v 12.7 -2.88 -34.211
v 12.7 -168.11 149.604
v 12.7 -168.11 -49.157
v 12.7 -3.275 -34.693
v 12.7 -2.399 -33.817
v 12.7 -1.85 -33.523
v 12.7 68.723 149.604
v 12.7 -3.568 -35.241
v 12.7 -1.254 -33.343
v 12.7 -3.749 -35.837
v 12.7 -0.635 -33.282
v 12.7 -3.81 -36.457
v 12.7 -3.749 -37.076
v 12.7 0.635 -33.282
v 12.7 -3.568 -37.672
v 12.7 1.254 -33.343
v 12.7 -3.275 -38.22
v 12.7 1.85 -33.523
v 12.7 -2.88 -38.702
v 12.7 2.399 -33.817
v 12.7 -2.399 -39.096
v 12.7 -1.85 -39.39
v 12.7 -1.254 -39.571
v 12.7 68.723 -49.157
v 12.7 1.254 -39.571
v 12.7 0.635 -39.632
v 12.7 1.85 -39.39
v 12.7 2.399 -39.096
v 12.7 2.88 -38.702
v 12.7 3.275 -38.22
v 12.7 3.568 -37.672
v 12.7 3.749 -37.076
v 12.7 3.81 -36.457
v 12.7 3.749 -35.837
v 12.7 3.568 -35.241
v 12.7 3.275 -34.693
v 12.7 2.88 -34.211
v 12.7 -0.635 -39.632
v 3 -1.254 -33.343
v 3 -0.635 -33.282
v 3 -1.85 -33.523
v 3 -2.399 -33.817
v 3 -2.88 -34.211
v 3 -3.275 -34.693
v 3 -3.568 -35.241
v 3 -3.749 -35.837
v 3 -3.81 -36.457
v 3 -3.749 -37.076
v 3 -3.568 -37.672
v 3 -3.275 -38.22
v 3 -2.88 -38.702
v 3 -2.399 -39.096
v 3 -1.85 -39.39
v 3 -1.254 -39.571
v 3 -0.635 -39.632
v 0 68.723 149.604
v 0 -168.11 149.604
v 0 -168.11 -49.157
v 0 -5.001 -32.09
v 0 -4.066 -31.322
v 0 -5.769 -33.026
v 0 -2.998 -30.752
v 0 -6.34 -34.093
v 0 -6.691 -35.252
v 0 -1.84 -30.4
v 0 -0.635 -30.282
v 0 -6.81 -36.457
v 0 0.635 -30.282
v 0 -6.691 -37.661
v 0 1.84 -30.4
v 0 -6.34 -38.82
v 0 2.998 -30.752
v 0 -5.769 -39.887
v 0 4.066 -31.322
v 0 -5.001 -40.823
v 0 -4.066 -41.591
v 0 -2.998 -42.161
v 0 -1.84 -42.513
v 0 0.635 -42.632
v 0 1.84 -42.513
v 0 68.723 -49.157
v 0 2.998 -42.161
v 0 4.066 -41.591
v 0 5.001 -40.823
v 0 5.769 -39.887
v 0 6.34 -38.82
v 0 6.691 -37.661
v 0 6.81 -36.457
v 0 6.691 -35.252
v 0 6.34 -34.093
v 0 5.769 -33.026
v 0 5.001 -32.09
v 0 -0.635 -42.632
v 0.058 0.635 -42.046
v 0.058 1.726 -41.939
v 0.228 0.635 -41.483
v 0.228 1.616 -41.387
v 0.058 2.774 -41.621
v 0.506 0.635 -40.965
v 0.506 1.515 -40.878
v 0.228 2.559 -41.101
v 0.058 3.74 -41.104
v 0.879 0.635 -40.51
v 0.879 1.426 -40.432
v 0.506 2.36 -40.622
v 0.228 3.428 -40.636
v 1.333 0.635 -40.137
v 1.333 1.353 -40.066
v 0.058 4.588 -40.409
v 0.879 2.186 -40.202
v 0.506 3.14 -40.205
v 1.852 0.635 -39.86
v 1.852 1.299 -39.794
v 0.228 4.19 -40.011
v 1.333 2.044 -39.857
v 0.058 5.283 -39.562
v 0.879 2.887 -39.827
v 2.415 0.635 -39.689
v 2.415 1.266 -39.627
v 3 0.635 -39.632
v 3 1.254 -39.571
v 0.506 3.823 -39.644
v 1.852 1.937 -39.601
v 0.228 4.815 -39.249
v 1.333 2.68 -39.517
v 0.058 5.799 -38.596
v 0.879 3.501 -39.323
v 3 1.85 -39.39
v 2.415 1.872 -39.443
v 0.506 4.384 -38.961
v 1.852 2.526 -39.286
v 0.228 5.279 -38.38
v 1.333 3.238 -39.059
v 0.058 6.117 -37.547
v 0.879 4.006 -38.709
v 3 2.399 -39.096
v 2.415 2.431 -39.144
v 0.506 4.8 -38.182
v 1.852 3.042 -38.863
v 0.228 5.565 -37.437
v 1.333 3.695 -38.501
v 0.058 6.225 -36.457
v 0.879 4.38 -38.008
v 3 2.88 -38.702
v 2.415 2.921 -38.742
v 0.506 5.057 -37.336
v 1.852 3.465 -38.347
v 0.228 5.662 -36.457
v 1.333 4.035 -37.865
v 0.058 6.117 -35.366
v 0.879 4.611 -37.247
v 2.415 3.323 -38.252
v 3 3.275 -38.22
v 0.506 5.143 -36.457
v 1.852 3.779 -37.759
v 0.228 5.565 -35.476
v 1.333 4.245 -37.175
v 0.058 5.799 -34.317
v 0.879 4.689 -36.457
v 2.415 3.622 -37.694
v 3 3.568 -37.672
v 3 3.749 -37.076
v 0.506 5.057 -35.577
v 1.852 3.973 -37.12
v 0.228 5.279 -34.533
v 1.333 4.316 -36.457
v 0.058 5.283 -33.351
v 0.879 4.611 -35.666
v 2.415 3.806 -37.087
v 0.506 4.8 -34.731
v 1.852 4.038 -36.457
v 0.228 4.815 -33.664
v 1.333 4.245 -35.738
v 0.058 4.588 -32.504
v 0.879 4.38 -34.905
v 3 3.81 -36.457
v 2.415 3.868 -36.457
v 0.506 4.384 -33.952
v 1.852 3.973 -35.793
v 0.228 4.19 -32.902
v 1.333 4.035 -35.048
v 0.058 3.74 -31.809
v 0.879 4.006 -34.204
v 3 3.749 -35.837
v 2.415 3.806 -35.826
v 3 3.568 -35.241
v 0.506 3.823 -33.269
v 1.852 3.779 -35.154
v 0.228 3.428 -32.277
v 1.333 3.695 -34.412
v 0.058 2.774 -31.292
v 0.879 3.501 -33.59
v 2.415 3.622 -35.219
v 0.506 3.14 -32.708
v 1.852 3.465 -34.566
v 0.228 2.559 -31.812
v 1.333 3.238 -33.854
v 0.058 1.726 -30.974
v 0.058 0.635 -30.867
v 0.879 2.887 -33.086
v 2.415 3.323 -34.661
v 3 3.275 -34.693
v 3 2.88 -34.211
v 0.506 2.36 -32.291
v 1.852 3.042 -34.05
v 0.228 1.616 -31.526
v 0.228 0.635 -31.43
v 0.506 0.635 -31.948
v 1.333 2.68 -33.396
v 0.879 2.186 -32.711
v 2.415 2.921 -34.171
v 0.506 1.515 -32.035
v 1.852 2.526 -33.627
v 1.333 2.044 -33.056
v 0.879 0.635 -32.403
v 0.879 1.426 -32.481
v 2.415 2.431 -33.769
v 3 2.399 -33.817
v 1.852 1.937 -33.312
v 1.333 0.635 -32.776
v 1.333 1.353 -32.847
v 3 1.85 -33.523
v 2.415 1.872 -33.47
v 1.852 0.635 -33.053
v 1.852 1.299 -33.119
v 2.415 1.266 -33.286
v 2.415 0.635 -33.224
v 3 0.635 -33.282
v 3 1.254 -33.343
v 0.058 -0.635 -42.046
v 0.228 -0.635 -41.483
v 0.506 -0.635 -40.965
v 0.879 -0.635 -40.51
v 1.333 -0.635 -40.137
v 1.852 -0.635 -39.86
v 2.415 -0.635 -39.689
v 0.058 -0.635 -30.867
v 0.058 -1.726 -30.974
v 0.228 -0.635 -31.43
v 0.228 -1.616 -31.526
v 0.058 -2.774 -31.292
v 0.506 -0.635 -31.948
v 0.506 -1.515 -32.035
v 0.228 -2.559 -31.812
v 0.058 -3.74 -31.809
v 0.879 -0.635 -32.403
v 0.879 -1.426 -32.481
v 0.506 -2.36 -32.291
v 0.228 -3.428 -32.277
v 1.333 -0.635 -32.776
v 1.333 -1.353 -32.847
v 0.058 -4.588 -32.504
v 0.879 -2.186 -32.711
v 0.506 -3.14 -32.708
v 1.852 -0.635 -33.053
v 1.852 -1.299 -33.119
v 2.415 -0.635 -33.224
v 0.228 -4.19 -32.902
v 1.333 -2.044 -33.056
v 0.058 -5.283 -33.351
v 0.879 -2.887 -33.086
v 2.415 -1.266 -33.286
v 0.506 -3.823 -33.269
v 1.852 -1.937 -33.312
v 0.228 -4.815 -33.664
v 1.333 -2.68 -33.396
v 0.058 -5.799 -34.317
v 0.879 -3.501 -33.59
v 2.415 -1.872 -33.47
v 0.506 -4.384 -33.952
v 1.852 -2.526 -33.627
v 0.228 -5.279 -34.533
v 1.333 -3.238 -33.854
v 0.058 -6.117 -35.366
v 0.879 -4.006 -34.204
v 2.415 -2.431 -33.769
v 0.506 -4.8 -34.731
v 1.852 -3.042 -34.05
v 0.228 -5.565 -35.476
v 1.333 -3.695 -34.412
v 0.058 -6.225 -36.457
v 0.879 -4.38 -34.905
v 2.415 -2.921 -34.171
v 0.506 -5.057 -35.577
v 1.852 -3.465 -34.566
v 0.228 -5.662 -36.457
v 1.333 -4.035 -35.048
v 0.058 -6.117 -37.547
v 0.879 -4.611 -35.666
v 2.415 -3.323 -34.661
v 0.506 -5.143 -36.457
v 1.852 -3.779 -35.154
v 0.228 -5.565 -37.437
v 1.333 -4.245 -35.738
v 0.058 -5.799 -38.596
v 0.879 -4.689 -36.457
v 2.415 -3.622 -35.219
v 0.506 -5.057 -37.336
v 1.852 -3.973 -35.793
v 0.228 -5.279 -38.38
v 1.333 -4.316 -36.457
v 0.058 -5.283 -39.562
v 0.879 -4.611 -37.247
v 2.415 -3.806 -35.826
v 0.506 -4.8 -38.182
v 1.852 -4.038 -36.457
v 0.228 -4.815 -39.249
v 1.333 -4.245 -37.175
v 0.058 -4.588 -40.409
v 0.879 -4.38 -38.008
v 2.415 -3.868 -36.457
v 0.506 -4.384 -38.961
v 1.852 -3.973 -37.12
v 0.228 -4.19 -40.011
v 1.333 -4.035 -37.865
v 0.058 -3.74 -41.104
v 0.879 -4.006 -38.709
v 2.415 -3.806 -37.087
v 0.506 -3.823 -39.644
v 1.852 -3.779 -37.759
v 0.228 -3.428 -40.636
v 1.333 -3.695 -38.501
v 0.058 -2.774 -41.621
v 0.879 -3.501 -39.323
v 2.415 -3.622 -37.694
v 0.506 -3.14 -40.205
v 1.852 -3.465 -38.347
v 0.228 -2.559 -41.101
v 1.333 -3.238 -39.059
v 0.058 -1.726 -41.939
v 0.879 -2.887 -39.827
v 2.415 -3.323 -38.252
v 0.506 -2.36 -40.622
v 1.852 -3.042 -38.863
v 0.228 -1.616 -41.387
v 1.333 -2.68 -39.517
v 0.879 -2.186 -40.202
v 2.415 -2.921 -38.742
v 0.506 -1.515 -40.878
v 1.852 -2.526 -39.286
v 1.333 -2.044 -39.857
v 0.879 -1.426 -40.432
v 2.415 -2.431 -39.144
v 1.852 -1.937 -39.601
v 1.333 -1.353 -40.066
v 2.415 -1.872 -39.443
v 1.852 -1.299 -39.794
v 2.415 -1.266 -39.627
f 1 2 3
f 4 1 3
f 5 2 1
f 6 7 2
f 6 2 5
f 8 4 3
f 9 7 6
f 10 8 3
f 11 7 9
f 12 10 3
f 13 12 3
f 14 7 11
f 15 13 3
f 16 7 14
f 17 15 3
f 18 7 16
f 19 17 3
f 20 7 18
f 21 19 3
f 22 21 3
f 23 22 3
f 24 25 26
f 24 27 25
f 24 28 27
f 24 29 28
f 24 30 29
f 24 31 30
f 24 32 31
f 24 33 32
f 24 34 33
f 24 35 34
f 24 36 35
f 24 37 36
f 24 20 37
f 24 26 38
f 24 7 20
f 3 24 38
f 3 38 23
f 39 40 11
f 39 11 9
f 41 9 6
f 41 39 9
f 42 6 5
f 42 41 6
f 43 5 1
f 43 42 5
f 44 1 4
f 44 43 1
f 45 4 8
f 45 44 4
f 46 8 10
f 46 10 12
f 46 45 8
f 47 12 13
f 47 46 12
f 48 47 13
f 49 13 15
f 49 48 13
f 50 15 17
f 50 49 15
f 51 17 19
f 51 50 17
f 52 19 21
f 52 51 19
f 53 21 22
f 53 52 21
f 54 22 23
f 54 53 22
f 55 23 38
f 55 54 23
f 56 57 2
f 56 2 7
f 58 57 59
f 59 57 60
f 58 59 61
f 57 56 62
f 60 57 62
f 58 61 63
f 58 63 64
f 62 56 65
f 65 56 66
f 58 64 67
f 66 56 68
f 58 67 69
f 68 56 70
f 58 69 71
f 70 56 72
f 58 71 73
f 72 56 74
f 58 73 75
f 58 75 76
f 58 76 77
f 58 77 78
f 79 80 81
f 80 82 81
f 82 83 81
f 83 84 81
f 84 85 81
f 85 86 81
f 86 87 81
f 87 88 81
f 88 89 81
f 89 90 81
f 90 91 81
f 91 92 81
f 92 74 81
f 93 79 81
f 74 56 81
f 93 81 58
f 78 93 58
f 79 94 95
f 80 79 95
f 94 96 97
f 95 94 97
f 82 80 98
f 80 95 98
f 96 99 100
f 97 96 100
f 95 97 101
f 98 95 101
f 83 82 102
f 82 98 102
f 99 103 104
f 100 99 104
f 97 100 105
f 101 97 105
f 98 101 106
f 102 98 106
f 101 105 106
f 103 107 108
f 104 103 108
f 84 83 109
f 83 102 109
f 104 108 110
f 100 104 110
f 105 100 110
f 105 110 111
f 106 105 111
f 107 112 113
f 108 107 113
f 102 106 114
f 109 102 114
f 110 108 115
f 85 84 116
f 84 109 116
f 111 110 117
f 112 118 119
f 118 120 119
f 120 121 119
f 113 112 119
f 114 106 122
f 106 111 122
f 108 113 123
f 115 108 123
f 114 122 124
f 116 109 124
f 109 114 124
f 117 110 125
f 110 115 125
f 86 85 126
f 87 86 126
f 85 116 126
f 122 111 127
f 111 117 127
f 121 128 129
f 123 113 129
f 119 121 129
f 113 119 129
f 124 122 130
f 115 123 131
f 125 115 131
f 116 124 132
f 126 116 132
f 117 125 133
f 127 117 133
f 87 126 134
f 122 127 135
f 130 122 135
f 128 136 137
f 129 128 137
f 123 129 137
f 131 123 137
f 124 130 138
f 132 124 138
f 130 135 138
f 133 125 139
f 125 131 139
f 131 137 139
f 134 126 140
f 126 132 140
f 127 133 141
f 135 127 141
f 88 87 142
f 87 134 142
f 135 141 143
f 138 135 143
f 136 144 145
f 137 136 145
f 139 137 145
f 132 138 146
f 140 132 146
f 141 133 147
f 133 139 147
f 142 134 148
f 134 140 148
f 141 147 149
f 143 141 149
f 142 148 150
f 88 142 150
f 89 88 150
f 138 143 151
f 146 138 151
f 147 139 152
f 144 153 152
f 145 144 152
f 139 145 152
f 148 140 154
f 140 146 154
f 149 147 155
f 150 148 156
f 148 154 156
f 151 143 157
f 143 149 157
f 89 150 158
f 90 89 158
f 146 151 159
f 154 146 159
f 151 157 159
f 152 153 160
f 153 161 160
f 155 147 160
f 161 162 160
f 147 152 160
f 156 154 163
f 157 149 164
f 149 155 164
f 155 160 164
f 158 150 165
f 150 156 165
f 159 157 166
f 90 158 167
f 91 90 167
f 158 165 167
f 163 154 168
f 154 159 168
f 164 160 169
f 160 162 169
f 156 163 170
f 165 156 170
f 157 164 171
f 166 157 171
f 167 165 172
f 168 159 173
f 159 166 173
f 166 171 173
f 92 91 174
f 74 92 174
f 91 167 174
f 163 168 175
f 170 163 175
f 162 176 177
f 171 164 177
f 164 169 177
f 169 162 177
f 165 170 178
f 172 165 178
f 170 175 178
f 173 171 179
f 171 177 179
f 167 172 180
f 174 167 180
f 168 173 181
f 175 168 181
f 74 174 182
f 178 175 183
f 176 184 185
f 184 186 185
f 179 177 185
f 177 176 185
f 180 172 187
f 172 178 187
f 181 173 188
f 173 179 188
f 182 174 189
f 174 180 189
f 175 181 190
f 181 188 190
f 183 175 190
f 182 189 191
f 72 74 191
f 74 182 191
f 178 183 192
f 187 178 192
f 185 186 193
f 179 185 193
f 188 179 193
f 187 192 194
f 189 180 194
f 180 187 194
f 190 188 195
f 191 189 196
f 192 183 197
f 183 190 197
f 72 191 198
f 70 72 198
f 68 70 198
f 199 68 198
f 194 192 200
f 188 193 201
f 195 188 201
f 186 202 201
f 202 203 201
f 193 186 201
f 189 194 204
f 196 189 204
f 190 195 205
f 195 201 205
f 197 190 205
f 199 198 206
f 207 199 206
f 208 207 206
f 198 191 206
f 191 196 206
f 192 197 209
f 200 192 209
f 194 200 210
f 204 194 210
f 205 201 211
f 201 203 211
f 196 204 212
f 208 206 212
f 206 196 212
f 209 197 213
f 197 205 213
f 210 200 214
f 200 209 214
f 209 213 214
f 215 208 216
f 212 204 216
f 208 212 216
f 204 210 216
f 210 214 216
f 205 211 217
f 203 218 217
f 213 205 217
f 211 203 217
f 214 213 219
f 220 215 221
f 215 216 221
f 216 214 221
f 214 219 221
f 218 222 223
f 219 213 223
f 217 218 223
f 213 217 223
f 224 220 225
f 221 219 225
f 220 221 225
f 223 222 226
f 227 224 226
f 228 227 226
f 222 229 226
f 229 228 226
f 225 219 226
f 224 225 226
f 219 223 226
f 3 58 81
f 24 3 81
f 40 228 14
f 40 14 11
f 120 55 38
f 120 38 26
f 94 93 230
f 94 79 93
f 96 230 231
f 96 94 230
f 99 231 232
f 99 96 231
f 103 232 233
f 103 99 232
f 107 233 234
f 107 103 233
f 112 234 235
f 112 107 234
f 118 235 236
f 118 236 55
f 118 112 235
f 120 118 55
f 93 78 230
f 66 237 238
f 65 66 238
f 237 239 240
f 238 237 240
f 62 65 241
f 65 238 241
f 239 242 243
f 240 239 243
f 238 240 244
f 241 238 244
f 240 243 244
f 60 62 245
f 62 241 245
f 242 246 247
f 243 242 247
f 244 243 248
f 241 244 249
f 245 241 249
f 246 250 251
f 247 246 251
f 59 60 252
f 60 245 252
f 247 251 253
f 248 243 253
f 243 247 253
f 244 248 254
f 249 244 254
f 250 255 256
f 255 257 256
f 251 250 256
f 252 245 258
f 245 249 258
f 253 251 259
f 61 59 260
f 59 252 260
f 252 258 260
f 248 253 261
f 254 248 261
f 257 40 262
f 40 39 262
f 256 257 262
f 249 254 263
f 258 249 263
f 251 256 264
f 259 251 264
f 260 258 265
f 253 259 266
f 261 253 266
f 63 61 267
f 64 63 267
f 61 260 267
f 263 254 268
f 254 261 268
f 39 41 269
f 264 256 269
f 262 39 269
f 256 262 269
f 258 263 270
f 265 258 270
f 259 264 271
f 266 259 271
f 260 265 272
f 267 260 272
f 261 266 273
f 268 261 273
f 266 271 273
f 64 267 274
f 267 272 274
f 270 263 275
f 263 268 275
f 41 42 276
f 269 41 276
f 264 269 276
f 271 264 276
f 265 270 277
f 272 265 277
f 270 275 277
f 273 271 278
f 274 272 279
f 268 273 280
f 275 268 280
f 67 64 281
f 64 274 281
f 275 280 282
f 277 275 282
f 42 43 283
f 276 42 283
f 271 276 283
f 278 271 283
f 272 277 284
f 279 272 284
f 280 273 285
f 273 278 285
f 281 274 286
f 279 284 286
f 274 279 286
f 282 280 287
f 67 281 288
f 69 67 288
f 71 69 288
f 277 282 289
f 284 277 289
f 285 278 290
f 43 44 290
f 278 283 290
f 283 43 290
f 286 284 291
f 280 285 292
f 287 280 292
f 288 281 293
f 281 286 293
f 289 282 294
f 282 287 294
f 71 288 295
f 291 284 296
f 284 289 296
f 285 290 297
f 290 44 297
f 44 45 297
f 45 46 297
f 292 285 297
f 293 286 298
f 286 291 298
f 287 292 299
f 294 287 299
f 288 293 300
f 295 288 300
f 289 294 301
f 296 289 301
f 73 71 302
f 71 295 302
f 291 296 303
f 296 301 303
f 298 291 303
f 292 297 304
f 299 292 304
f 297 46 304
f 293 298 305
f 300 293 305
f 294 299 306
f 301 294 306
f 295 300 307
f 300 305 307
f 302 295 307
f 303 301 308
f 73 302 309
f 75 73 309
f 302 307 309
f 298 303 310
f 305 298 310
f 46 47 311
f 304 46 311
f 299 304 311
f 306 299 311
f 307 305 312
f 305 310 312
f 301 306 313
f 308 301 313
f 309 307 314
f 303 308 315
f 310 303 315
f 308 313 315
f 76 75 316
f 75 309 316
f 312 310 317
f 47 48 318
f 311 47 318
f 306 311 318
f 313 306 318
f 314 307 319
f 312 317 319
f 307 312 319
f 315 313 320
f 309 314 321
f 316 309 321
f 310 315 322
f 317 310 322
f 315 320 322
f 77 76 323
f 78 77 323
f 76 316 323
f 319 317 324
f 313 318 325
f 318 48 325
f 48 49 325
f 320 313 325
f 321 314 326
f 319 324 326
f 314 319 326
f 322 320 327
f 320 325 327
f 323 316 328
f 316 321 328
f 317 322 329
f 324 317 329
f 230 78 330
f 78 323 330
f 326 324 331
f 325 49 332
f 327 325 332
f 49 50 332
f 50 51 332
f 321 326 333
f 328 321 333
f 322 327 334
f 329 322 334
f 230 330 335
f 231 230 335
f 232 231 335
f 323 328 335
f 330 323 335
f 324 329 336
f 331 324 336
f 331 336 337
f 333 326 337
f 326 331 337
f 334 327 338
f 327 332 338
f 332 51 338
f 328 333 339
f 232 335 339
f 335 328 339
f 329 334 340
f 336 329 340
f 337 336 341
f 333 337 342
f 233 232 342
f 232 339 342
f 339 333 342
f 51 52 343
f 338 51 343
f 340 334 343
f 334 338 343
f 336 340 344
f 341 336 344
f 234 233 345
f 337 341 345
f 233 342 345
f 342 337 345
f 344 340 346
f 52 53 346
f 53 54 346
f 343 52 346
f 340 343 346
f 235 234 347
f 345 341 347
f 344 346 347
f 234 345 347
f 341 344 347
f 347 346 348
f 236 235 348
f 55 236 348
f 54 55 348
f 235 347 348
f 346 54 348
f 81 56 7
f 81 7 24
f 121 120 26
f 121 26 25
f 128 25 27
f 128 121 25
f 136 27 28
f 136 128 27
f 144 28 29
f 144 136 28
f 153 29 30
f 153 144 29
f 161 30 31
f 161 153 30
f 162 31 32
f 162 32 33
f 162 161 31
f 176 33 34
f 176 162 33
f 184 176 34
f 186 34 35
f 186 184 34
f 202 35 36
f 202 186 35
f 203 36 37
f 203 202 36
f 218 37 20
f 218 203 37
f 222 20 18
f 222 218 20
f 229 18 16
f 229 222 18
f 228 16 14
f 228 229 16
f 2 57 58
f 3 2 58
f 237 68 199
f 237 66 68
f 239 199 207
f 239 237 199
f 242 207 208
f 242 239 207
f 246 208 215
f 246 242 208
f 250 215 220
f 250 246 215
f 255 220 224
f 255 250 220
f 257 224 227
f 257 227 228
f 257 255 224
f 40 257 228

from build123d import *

# Parameters (mm, degrees)
SKETCH1_W           = 198.761009384
SKETCH1_H           = 236.83336565
BOSS_EXTRUDE1_DEPTH = 12.7
CUT_EXTRUDE1_DEPTH  = 12.7
FILLET1_R           = 3


with BuildPart() as part:
    # Sketch1 → Boss-Extrude1 (new body)
    with BuildSketch(Plane(origin=(0, 0, 0), x_dir=(0, 0, -1), z_dir=(1, 0, 0))):
        with Locations((-50.223991022, -49.693394246)):
            Rectangle(SKETCH1_W, SKETCH1_H)
    extrude(amount=BOSS_EXTRUDE1_DEPTH)

    # Sketch2 → Cut-Extrude1 (cut)
    with BuildSketch(Plane.ZY):
        with BuildLine():
            Line((-33.28151367, 0.635), (-33.28151367, -0.635))
            ThreePointArc((-33.28151367, -0.635), (-36.45651367, -3.81), (-39.63151367, -0.635))
            Line((-39.63151367, -0.635), (-39.63151367, 0.635))
            ThreePointArc((-39.63151367, 0.635), (-36.45651367, 3.81), (-33.28151367, 0.635))
        make_face()
    extrude(amount=-CUT_EXTRUDE1_DEPTH, mode=Mode.SUBTRACT)

    # Fillet1
    fillet1_edges = [part.edges().sort_by_distance(p)[0] for p in [
        (0, 3.81, -36.45651367),
        (0, 0, -39.63151367),
        (0, -3.81, -36.45651367),
        (0, 0, -33.28151367),
    ]]
    fillet(fillet1_edges, radius=FILLET1_R)


solid = part.part
